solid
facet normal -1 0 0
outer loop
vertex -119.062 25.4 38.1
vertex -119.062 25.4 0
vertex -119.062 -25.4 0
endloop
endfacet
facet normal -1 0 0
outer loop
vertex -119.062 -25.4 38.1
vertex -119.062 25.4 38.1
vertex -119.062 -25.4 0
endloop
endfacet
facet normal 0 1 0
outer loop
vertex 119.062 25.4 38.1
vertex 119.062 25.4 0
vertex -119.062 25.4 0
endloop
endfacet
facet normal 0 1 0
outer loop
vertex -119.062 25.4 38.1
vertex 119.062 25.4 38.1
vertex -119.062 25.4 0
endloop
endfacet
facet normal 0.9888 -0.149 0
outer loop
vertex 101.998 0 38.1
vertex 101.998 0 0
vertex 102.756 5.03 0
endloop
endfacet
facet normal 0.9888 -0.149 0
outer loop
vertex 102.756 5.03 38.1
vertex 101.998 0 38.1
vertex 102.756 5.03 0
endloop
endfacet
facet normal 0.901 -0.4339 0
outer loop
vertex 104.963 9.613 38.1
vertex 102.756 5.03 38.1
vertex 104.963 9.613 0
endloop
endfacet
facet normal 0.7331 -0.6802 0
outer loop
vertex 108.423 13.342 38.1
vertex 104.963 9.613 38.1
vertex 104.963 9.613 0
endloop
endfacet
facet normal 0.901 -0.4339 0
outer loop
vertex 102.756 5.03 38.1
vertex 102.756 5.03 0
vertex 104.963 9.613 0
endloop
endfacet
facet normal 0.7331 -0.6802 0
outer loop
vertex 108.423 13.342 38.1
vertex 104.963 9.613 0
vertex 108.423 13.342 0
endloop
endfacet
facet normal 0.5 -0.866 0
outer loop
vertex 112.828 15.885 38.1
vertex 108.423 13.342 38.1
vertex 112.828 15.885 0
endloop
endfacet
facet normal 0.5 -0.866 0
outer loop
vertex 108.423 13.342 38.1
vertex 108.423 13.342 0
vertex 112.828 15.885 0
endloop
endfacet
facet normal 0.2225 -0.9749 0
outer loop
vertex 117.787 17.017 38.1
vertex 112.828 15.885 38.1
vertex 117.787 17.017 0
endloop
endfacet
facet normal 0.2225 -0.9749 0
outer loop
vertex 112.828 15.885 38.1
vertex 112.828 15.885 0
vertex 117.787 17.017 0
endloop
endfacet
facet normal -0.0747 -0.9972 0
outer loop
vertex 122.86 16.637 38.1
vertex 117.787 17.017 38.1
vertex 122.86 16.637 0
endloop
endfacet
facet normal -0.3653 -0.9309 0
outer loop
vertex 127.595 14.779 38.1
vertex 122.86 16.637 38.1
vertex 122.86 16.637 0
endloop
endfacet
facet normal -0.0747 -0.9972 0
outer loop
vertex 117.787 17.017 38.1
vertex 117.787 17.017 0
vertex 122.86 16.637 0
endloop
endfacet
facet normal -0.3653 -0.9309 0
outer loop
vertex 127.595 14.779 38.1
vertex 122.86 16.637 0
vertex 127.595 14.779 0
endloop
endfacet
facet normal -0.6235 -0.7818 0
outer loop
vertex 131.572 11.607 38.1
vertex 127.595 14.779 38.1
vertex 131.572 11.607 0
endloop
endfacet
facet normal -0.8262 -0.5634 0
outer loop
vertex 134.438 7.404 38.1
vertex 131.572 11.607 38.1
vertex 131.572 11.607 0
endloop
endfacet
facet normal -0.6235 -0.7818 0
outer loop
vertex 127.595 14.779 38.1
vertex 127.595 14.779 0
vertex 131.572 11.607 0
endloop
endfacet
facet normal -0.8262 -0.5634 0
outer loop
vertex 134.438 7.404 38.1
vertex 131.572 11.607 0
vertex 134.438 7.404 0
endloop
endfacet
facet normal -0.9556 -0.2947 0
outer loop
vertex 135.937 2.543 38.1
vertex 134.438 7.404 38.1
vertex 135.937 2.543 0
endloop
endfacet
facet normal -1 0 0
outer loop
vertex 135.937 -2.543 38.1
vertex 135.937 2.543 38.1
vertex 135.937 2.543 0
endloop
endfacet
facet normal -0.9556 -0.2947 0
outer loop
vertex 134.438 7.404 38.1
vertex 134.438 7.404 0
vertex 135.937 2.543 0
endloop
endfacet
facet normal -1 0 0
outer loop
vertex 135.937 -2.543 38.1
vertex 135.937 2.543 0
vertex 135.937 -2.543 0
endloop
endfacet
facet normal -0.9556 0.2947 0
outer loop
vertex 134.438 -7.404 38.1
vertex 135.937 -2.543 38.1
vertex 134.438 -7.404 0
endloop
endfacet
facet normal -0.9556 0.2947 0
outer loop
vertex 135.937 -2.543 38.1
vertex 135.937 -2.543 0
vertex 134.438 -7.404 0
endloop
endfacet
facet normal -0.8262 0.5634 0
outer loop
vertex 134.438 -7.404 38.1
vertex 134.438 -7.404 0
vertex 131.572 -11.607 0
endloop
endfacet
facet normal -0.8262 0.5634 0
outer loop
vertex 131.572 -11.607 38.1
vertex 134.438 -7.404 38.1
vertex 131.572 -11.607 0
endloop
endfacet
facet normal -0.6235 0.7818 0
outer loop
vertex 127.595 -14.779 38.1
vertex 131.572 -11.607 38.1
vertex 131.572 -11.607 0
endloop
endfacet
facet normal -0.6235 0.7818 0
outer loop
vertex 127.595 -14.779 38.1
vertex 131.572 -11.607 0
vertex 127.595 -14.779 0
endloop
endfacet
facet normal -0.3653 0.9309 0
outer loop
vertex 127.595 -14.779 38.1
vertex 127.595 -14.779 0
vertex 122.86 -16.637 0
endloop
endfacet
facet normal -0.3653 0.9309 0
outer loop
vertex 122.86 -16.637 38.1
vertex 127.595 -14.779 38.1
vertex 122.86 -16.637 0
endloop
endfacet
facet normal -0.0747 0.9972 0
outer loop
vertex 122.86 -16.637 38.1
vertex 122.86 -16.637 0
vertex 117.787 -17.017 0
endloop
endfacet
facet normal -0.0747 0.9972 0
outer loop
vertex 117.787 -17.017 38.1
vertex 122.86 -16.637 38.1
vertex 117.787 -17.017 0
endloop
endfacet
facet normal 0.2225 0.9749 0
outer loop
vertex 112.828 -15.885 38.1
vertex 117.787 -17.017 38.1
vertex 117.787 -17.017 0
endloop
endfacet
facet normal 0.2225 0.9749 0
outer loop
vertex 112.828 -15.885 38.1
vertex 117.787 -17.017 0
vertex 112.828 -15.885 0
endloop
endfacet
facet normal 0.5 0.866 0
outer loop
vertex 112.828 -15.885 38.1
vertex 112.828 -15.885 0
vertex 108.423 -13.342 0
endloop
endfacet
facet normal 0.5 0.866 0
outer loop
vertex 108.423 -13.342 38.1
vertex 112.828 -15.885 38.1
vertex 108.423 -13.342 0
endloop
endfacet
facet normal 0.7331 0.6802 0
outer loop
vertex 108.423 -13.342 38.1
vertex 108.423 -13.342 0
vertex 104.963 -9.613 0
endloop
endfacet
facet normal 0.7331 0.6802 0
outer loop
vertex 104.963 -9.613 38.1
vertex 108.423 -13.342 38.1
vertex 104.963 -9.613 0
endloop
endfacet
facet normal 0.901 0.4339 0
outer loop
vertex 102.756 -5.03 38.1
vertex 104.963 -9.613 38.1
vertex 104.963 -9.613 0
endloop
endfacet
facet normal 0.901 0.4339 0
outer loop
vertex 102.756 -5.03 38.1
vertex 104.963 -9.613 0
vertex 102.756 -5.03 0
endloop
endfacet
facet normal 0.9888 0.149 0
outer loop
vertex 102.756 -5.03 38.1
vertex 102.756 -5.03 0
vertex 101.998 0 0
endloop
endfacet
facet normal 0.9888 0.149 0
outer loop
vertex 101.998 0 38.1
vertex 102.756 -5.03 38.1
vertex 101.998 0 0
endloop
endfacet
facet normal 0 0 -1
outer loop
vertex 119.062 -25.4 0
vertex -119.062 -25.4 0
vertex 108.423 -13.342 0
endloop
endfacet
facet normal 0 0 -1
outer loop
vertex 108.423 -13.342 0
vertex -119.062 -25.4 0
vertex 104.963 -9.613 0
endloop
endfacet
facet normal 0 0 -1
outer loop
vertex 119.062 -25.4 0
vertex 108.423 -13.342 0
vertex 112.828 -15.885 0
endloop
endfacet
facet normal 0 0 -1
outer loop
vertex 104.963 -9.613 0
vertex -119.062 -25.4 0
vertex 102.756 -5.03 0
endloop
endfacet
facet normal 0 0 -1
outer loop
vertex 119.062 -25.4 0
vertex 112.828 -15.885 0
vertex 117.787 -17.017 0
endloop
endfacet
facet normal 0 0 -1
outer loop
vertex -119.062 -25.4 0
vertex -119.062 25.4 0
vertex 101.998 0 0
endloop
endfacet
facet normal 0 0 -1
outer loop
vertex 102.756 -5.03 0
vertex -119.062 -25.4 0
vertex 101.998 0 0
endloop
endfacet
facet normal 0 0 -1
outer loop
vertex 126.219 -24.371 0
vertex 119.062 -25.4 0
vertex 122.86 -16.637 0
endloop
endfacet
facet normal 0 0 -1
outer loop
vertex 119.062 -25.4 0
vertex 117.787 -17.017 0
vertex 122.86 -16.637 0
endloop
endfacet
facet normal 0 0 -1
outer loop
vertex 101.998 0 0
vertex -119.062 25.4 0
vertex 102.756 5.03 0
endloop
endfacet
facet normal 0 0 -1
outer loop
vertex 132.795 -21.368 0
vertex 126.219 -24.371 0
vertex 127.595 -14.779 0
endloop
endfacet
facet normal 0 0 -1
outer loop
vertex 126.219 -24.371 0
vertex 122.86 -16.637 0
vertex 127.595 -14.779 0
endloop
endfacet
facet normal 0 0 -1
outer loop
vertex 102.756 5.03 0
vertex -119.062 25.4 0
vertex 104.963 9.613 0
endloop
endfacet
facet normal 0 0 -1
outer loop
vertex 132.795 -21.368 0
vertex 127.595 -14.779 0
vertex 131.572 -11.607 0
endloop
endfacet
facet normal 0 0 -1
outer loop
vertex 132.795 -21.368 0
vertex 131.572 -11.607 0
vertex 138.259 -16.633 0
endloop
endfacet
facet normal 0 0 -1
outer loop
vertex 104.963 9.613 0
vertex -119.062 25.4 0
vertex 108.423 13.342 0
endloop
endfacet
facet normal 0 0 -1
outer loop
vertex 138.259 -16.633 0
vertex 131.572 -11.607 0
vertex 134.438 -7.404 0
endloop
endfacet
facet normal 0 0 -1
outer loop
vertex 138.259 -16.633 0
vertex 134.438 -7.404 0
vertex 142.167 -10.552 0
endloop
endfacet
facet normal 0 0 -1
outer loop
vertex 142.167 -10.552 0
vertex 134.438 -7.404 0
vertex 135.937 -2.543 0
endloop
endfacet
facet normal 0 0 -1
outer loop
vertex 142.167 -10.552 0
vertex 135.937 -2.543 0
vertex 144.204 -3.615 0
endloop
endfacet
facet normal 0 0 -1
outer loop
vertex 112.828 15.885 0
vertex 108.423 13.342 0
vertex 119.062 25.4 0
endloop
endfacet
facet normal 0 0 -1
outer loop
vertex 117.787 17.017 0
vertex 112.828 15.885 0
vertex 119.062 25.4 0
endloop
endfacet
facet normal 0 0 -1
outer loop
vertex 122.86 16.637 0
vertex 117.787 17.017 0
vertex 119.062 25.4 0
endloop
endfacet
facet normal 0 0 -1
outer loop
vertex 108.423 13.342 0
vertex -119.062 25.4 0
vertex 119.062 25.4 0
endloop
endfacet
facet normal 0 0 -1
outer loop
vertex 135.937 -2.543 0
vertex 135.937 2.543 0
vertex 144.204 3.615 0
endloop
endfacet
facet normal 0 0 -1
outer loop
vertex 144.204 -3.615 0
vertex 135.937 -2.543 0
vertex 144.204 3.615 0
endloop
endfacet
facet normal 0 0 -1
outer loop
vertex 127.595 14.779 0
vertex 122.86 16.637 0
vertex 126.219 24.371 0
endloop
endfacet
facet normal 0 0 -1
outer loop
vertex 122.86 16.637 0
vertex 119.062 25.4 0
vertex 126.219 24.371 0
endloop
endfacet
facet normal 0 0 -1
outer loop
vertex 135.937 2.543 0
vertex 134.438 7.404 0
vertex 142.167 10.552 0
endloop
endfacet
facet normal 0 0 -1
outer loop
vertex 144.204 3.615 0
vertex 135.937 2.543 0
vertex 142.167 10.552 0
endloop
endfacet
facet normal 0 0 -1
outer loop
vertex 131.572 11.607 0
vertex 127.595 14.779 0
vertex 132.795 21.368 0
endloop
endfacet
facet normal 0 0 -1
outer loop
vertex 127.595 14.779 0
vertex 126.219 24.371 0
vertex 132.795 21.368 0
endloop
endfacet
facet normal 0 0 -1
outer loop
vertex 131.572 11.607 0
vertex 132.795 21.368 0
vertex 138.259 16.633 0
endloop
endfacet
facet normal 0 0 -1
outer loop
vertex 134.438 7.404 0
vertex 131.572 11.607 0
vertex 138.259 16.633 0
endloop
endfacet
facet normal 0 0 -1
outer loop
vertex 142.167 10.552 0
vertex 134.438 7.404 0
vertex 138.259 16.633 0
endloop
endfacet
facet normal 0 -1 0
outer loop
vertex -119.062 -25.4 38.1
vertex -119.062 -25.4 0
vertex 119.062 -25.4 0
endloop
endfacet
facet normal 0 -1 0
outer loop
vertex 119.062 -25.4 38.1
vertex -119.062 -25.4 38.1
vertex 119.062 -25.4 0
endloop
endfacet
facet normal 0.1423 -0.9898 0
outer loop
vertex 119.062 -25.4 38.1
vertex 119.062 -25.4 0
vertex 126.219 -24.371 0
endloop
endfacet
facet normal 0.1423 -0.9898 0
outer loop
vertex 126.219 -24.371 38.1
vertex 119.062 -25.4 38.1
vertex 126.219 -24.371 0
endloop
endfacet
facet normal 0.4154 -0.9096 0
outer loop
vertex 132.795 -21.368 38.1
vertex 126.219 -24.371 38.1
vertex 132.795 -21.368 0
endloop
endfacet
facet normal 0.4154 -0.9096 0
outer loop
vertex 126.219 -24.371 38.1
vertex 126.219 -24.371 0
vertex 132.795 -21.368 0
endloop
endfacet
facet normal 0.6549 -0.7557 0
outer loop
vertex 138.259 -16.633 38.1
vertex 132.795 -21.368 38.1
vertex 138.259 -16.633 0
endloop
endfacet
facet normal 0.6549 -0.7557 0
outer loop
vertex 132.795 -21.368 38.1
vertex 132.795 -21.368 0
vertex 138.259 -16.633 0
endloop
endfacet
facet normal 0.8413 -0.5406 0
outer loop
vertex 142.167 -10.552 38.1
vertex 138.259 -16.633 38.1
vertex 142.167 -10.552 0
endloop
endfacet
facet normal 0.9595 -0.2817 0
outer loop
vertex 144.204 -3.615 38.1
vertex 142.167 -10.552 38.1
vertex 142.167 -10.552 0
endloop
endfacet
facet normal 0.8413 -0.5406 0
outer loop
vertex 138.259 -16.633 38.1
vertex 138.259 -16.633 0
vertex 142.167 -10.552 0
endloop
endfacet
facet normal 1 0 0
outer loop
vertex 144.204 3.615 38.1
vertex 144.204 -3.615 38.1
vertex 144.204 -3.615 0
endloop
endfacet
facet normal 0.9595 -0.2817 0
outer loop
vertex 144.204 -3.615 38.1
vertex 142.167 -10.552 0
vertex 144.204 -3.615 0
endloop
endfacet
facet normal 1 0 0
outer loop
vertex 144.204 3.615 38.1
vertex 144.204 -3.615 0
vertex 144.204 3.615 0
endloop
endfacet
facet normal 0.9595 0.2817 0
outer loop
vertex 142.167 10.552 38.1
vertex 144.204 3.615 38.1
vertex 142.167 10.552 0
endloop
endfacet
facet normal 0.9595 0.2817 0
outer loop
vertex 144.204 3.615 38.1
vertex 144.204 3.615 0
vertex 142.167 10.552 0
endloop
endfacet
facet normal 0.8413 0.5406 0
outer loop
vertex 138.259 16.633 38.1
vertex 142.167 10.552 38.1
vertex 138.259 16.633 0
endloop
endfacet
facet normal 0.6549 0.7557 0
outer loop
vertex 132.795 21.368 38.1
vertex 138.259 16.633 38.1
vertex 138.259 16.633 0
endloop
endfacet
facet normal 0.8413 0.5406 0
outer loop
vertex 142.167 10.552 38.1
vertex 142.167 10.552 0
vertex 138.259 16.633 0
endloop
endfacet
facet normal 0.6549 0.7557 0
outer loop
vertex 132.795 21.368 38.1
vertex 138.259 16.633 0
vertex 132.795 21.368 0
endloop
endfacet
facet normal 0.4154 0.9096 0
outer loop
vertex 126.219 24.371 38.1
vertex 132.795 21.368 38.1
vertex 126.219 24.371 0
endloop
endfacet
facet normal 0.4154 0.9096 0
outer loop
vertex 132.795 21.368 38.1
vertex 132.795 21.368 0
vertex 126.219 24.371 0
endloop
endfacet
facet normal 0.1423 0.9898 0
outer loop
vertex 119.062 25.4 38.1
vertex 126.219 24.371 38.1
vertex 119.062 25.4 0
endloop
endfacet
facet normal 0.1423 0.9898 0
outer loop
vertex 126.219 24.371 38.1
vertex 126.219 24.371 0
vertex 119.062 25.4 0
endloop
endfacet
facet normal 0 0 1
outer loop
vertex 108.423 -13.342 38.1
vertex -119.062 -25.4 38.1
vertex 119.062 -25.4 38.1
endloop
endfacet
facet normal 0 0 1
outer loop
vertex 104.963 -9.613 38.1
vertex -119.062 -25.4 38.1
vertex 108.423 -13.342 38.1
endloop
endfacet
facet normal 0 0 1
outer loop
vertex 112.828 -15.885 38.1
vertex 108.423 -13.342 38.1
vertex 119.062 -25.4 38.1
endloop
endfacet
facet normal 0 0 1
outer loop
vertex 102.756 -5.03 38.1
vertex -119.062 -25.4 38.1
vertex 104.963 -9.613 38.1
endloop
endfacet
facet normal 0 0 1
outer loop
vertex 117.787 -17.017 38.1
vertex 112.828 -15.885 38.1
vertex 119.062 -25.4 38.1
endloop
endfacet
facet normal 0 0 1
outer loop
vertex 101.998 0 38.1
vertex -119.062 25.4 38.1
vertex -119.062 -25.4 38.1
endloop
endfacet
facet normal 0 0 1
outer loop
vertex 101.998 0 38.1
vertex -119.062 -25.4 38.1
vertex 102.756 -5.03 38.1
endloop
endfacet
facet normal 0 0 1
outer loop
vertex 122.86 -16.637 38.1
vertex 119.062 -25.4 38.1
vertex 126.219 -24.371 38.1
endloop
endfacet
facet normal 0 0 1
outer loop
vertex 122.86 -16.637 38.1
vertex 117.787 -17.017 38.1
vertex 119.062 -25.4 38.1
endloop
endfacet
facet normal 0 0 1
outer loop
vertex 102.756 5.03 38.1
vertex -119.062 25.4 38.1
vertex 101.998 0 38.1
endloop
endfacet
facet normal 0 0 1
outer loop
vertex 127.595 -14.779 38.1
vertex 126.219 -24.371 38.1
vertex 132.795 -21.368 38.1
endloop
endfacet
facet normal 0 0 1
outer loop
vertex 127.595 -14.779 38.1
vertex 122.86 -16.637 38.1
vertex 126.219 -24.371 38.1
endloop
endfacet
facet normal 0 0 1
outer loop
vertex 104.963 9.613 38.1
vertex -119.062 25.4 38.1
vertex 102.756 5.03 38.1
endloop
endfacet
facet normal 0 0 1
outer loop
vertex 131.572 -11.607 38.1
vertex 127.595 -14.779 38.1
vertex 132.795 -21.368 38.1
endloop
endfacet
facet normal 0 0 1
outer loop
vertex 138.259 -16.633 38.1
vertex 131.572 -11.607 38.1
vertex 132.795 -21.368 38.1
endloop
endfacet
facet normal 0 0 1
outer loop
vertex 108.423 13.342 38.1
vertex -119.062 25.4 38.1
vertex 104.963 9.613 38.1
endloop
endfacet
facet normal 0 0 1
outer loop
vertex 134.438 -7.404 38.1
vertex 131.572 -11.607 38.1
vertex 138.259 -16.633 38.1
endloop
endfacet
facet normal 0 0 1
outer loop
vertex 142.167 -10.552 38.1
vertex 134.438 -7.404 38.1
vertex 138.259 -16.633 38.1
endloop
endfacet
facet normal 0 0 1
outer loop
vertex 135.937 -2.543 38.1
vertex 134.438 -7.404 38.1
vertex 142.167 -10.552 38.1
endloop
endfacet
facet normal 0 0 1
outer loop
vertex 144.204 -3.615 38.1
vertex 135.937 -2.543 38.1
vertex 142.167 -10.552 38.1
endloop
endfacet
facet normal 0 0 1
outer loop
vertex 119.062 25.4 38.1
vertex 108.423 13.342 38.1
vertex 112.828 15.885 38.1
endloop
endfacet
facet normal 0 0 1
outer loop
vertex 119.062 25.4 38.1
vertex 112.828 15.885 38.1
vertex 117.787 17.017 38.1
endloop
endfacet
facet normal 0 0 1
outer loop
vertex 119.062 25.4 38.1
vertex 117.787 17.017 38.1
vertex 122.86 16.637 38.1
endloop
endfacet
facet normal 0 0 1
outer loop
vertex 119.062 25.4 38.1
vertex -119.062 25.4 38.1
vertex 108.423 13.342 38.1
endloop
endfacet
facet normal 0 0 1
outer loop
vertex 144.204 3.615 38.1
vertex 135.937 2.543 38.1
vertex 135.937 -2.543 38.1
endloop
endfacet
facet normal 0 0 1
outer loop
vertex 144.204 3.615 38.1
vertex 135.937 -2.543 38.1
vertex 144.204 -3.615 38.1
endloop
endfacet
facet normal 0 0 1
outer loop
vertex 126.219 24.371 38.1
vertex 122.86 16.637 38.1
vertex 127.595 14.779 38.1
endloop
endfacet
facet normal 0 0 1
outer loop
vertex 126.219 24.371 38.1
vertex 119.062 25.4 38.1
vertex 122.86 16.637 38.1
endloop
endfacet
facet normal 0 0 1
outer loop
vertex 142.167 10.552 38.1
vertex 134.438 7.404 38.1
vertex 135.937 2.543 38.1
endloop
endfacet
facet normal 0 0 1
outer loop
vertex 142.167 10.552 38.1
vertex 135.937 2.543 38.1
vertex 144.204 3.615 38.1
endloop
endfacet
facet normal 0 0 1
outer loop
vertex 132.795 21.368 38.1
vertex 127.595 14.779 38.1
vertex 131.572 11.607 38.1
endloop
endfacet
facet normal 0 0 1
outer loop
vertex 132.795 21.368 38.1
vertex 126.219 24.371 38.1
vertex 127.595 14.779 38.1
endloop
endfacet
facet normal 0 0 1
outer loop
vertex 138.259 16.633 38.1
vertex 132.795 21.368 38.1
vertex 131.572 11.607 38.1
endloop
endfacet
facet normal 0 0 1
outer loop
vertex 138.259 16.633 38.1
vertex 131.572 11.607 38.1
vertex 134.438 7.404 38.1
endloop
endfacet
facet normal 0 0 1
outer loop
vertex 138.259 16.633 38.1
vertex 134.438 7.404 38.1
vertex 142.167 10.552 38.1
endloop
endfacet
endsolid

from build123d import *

# Parameters (mm, degrees)
F1_DEPTH = 38.1
F3_D     = 34.12998


with BuildPart() as f1:
    # F0 (on Top) → F1 (new body)
    with BuildSketch(Plane.XY):
        with BuildLine():
            ThreePointArc((119.0625, -25.4), (144.4625, 0), (119.0625, 25.4))
            Line((119.0625, 25.4), (-119.0625, 25.4))
            Line((-119.0625, 25.4), (-119.0625, -25.4))
            Line((-119.0625, -25.4), (119.0625, -25.4))
        make_face()
    extrude(amount=F1_DEPTH)

    # F3 (through all)
    with Locations(Plane.XY.offset(38.1)):
        with Locations((119.0625, 0)):
            Hole(F3_D / 2)


solid = f1.part
